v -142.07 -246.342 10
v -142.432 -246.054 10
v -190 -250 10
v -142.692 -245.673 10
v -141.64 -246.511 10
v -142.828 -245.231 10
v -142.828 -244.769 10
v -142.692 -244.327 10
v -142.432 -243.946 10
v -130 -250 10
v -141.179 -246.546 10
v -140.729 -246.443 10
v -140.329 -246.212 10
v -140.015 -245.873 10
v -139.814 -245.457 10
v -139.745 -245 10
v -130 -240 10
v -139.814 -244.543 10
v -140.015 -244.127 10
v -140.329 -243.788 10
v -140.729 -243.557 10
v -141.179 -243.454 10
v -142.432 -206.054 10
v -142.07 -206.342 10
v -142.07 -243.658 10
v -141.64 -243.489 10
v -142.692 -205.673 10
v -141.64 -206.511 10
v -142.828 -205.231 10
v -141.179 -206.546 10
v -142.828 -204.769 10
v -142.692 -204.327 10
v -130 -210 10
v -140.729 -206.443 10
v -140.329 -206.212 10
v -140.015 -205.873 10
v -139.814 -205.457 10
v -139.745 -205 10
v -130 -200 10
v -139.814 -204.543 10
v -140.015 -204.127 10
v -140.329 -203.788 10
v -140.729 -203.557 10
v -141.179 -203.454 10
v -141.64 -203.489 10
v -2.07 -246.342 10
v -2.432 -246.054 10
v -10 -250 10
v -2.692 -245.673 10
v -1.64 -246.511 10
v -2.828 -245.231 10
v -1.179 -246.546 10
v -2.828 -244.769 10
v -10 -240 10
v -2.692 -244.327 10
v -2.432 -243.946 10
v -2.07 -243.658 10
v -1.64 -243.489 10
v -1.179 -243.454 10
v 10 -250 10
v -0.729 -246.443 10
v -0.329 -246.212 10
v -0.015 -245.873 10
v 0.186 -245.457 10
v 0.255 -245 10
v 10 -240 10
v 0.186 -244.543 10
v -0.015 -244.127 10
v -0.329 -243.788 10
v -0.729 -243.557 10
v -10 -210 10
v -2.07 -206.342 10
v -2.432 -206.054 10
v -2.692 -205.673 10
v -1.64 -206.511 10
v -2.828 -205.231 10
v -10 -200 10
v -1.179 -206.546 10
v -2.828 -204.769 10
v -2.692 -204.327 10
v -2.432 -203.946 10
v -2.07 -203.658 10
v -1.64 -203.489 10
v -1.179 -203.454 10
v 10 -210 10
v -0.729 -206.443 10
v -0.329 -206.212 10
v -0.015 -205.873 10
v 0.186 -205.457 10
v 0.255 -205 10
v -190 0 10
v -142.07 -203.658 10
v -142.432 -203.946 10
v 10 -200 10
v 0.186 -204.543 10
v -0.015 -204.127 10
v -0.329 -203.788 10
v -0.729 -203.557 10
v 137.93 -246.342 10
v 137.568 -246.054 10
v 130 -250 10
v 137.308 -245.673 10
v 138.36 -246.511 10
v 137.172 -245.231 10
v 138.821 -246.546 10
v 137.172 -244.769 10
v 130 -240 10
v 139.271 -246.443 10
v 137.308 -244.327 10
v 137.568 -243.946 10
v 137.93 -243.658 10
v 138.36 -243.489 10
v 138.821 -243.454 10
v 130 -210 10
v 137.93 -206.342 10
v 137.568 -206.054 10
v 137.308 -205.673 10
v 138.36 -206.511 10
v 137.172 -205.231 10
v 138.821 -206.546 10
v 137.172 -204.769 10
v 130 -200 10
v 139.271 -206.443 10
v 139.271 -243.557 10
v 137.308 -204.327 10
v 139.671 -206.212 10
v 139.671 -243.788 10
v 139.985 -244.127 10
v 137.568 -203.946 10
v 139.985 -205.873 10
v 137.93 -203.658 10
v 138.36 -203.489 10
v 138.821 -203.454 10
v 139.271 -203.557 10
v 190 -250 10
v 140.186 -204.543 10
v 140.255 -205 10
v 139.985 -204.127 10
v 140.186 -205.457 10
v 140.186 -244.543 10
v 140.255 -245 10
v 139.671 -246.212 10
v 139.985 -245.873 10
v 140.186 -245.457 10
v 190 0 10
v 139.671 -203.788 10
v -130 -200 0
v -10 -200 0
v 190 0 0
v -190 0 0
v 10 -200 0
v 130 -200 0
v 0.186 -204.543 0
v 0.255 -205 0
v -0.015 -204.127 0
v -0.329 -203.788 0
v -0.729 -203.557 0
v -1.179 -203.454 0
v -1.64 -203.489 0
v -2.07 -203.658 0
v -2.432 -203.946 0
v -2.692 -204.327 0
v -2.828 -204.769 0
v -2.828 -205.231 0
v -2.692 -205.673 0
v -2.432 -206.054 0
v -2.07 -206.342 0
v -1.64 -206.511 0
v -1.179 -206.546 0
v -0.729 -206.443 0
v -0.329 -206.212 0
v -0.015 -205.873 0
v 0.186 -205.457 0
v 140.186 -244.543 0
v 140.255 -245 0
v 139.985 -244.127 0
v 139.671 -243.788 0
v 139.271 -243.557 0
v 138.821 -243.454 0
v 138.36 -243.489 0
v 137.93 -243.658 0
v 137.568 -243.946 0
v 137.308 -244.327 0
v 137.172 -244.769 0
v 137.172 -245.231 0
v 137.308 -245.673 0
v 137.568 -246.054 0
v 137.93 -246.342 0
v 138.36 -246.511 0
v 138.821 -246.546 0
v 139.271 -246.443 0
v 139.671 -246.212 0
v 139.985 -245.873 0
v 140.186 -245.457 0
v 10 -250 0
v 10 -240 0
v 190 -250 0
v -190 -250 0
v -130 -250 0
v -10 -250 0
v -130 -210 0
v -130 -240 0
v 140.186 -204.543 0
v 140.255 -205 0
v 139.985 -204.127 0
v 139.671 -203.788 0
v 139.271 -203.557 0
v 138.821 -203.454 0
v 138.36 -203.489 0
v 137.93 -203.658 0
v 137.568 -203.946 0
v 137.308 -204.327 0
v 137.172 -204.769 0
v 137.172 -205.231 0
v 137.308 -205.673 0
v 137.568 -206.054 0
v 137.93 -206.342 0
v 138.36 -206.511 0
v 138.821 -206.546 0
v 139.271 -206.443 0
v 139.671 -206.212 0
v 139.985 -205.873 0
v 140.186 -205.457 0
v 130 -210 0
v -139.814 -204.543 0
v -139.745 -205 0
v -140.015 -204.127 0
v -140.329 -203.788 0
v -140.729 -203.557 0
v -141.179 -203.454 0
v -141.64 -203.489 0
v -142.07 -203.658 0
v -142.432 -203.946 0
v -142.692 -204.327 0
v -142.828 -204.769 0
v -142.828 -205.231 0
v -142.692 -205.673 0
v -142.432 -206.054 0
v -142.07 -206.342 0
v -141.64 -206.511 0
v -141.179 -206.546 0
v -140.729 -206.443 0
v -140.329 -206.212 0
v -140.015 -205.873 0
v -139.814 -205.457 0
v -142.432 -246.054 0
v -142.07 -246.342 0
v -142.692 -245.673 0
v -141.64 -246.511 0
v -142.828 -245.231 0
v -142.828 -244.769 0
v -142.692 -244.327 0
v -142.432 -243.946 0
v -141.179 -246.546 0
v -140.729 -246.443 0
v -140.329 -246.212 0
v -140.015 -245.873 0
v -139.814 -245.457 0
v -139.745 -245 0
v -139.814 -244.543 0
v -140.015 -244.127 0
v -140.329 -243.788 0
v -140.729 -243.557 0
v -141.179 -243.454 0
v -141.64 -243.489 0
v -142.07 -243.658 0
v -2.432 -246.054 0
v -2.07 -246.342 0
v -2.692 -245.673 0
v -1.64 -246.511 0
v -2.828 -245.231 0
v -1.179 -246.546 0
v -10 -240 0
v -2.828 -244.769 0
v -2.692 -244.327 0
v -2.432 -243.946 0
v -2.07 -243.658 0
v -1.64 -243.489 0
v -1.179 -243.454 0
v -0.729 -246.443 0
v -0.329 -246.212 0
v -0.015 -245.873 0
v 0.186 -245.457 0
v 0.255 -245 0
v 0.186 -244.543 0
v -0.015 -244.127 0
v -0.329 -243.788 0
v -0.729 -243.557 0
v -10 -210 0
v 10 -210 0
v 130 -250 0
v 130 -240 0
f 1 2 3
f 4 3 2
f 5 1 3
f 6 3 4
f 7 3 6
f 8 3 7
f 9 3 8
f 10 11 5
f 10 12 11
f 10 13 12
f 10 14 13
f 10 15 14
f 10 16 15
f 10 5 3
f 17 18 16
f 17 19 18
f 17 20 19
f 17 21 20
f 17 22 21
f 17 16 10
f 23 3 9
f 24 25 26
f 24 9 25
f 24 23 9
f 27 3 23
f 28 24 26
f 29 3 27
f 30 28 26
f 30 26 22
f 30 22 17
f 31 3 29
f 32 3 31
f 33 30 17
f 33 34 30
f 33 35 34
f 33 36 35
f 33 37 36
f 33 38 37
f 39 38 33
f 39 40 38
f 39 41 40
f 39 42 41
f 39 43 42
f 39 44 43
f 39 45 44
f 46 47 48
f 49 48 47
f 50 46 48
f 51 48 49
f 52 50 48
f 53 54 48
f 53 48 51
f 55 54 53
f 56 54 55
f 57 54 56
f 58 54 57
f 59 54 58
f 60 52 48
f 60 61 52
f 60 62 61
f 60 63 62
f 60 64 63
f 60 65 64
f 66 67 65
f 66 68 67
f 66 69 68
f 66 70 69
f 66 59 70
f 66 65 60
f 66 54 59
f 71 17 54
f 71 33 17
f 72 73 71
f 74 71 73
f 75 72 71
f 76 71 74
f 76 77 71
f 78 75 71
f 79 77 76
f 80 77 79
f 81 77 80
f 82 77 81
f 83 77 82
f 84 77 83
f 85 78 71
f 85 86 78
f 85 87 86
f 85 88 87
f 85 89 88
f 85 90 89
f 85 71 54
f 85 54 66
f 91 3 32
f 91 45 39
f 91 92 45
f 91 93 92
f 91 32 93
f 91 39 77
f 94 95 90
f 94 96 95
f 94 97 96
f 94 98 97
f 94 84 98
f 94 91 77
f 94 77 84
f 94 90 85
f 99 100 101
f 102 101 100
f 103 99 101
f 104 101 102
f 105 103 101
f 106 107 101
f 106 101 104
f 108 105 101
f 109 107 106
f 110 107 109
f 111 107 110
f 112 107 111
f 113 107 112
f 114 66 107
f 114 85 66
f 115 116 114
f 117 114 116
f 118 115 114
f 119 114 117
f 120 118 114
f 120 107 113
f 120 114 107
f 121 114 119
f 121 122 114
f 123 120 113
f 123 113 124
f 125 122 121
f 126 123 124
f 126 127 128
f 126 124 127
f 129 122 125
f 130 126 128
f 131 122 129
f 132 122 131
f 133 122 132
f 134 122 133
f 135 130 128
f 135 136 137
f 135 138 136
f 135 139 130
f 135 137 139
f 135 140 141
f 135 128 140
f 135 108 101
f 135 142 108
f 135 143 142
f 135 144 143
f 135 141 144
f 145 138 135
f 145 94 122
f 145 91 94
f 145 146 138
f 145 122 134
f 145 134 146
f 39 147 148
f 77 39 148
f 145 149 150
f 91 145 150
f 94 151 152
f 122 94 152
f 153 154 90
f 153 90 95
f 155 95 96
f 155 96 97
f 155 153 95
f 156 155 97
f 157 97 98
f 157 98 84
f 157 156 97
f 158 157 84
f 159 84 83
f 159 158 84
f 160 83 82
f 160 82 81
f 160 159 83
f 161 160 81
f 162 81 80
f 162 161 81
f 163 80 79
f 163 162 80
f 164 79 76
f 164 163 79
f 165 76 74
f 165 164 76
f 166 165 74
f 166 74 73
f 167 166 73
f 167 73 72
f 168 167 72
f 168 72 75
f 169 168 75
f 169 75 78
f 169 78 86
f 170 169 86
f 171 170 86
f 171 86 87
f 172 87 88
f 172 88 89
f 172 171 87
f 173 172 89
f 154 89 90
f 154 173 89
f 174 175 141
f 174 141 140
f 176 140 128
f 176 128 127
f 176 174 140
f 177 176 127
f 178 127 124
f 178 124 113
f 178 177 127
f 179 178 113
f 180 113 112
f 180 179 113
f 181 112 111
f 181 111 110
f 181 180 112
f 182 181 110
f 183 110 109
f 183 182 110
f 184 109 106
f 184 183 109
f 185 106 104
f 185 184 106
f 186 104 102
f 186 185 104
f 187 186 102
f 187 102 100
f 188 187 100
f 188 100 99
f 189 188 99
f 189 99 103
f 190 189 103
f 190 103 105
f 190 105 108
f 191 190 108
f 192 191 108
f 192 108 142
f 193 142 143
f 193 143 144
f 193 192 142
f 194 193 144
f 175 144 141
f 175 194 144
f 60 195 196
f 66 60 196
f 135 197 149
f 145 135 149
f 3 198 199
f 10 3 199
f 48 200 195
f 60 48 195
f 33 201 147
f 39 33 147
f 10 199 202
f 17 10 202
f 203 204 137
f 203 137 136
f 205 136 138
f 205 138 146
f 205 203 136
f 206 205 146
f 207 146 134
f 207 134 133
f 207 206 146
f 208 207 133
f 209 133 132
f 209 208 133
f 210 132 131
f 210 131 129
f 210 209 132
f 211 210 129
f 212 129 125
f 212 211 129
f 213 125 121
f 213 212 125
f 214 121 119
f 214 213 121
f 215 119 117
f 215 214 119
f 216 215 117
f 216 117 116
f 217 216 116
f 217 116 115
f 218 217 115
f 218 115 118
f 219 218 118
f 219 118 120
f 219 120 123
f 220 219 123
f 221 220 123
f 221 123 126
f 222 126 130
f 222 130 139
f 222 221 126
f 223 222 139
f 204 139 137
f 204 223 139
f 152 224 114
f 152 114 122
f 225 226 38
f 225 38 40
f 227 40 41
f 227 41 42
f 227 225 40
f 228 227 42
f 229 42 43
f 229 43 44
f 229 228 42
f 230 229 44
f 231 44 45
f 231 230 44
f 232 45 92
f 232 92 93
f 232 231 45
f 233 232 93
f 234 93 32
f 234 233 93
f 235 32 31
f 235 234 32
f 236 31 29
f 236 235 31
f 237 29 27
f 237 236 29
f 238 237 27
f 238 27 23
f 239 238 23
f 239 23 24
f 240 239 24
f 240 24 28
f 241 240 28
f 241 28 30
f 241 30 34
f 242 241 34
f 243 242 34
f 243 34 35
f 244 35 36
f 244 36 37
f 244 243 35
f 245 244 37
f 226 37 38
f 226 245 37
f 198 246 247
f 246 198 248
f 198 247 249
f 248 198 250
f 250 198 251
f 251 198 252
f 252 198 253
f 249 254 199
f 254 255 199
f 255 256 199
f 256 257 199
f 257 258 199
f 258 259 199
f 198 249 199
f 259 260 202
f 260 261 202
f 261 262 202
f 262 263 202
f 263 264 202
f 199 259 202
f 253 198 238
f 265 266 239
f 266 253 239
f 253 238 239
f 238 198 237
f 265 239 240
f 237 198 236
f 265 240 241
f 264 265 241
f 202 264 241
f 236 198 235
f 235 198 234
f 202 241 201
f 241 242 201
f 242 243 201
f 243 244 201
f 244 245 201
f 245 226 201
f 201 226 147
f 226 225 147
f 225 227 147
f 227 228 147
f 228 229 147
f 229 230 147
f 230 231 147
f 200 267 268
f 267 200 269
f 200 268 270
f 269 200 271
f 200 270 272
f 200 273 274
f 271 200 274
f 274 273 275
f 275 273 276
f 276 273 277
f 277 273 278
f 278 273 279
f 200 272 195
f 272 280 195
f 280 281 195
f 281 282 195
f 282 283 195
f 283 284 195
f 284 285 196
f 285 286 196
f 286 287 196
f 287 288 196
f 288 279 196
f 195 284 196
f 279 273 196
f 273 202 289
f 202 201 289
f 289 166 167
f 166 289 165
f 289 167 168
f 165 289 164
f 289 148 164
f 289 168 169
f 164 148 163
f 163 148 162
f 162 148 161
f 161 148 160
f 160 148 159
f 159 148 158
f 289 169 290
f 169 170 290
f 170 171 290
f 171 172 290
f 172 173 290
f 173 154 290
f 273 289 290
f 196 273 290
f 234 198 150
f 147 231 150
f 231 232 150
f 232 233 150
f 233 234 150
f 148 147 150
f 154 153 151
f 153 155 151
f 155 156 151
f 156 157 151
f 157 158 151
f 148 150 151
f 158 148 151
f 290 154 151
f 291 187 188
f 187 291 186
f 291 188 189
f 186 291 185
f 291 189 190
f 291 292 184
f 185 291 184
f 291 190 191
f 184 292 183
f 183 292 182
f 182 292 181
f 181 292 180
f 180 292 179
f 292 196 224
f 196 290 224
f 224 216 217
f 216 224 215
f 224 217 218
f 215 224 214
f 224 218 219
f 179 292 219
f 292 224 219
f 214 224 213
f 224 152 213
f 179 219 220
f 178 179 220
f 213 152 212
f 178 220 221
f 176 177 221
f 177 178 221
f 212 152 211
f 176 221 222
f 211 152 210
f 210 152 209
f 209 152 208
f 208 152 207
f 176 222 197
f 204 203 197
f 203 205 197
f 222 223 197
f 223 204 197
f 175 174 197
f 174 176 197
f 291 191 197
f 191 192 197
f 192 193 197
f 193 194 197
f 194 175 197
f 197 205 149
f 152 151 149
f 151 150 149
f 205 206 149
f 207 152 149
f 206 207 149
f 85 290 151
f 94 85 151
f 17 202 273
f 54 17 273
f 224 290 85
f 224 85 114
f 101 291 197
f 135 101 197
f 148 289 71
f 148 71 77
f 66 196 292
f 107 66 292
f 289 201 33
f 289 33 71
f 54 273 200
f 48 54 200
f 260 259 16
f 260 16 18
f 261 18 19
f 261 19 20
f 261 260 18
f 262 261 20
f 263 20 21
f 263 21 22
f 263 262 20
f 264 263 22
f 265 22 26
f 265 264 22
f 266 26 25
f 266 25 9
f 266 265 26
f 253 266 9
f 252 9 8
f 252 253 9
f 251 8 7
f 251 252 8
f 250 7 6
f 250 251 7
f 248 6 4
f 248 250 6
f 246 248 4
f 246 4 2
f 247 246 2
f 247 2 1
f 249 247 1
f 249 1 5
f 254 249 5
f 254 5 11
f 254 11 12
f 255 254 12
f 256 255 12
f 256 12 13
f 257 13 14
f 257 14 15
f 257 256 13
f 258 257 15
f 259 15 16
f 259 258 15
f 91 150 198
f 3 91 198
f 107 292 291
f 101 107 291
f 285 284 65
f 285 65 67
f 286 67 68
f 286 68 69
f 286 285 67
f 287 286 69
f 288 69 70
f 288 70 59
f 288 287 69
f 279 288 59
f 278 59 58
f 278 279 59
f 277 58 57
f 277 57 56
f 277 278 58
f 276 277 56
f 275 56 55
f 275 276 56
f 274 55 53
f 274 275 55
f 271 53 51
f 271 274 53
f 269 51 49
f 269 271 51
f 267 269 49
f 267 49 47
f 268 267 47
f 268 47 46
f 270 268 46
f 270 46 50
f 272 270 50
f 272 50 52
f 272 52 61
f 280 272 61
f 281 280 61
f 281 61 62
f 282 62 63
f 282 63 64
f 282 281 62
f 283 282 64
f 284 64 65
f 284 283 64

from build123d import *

# Parameters (mm, degrees)
IZIM1_R             = 1.55
IZIM1_W             = 120
IZIM1_H             = 10
BOSS_EXTRUDE2_DEPTH = 10


with BuildPart() as part:
    # Çizim1 → Boss-Extrude2 (new body)
    with BuildSketch(Plane.XY):
        Polygon((-130, -250), (-130, -240), (-10, -240), (-10, -250), (10, -250), (10, -240), (130, -240), (130, -250), (190, -250), (190, 0), (-190, 0), (-190, -250), align=None)
        with Locations((-141.295330694, -245)):
            Circle(IZIM1_R, mode=Mode.SUBTRACT)
        with Locations((-141.295330694, -205)):
            Circle(IZIM1_R, mode=Mode.SUBTRACT)
        with Locations((-70, -205)):
            Rectangle(IZIM1_W, IZIM1_H, mode=Mode.SUBTRACT)
        with Locations((-1.295330694, -245)):
            Circle(IZIM1_R, mode=Mode.SUBTRACT)
        with Locations((-1.295330694, -205)):
            Circle(IZIM1_R, mode=Mode.SUBTRACT)
        with Locations((70, -205)):
            Rectangle(IZIM1_W, IZIM1_H, mode=Mode.SUBTRACT)
        with Locations((138.704669306, -245)):
            Circle(IZIM1_R, mode=Mode.SUBTRACT)
        with Locations((138.704669306, -205)):
            Circle(IZIM1_R, mode=Mode.SUBTRACT)
    extrude(amount=BOSS_EXTRUDE2_DEPTH)


solid = part.part
